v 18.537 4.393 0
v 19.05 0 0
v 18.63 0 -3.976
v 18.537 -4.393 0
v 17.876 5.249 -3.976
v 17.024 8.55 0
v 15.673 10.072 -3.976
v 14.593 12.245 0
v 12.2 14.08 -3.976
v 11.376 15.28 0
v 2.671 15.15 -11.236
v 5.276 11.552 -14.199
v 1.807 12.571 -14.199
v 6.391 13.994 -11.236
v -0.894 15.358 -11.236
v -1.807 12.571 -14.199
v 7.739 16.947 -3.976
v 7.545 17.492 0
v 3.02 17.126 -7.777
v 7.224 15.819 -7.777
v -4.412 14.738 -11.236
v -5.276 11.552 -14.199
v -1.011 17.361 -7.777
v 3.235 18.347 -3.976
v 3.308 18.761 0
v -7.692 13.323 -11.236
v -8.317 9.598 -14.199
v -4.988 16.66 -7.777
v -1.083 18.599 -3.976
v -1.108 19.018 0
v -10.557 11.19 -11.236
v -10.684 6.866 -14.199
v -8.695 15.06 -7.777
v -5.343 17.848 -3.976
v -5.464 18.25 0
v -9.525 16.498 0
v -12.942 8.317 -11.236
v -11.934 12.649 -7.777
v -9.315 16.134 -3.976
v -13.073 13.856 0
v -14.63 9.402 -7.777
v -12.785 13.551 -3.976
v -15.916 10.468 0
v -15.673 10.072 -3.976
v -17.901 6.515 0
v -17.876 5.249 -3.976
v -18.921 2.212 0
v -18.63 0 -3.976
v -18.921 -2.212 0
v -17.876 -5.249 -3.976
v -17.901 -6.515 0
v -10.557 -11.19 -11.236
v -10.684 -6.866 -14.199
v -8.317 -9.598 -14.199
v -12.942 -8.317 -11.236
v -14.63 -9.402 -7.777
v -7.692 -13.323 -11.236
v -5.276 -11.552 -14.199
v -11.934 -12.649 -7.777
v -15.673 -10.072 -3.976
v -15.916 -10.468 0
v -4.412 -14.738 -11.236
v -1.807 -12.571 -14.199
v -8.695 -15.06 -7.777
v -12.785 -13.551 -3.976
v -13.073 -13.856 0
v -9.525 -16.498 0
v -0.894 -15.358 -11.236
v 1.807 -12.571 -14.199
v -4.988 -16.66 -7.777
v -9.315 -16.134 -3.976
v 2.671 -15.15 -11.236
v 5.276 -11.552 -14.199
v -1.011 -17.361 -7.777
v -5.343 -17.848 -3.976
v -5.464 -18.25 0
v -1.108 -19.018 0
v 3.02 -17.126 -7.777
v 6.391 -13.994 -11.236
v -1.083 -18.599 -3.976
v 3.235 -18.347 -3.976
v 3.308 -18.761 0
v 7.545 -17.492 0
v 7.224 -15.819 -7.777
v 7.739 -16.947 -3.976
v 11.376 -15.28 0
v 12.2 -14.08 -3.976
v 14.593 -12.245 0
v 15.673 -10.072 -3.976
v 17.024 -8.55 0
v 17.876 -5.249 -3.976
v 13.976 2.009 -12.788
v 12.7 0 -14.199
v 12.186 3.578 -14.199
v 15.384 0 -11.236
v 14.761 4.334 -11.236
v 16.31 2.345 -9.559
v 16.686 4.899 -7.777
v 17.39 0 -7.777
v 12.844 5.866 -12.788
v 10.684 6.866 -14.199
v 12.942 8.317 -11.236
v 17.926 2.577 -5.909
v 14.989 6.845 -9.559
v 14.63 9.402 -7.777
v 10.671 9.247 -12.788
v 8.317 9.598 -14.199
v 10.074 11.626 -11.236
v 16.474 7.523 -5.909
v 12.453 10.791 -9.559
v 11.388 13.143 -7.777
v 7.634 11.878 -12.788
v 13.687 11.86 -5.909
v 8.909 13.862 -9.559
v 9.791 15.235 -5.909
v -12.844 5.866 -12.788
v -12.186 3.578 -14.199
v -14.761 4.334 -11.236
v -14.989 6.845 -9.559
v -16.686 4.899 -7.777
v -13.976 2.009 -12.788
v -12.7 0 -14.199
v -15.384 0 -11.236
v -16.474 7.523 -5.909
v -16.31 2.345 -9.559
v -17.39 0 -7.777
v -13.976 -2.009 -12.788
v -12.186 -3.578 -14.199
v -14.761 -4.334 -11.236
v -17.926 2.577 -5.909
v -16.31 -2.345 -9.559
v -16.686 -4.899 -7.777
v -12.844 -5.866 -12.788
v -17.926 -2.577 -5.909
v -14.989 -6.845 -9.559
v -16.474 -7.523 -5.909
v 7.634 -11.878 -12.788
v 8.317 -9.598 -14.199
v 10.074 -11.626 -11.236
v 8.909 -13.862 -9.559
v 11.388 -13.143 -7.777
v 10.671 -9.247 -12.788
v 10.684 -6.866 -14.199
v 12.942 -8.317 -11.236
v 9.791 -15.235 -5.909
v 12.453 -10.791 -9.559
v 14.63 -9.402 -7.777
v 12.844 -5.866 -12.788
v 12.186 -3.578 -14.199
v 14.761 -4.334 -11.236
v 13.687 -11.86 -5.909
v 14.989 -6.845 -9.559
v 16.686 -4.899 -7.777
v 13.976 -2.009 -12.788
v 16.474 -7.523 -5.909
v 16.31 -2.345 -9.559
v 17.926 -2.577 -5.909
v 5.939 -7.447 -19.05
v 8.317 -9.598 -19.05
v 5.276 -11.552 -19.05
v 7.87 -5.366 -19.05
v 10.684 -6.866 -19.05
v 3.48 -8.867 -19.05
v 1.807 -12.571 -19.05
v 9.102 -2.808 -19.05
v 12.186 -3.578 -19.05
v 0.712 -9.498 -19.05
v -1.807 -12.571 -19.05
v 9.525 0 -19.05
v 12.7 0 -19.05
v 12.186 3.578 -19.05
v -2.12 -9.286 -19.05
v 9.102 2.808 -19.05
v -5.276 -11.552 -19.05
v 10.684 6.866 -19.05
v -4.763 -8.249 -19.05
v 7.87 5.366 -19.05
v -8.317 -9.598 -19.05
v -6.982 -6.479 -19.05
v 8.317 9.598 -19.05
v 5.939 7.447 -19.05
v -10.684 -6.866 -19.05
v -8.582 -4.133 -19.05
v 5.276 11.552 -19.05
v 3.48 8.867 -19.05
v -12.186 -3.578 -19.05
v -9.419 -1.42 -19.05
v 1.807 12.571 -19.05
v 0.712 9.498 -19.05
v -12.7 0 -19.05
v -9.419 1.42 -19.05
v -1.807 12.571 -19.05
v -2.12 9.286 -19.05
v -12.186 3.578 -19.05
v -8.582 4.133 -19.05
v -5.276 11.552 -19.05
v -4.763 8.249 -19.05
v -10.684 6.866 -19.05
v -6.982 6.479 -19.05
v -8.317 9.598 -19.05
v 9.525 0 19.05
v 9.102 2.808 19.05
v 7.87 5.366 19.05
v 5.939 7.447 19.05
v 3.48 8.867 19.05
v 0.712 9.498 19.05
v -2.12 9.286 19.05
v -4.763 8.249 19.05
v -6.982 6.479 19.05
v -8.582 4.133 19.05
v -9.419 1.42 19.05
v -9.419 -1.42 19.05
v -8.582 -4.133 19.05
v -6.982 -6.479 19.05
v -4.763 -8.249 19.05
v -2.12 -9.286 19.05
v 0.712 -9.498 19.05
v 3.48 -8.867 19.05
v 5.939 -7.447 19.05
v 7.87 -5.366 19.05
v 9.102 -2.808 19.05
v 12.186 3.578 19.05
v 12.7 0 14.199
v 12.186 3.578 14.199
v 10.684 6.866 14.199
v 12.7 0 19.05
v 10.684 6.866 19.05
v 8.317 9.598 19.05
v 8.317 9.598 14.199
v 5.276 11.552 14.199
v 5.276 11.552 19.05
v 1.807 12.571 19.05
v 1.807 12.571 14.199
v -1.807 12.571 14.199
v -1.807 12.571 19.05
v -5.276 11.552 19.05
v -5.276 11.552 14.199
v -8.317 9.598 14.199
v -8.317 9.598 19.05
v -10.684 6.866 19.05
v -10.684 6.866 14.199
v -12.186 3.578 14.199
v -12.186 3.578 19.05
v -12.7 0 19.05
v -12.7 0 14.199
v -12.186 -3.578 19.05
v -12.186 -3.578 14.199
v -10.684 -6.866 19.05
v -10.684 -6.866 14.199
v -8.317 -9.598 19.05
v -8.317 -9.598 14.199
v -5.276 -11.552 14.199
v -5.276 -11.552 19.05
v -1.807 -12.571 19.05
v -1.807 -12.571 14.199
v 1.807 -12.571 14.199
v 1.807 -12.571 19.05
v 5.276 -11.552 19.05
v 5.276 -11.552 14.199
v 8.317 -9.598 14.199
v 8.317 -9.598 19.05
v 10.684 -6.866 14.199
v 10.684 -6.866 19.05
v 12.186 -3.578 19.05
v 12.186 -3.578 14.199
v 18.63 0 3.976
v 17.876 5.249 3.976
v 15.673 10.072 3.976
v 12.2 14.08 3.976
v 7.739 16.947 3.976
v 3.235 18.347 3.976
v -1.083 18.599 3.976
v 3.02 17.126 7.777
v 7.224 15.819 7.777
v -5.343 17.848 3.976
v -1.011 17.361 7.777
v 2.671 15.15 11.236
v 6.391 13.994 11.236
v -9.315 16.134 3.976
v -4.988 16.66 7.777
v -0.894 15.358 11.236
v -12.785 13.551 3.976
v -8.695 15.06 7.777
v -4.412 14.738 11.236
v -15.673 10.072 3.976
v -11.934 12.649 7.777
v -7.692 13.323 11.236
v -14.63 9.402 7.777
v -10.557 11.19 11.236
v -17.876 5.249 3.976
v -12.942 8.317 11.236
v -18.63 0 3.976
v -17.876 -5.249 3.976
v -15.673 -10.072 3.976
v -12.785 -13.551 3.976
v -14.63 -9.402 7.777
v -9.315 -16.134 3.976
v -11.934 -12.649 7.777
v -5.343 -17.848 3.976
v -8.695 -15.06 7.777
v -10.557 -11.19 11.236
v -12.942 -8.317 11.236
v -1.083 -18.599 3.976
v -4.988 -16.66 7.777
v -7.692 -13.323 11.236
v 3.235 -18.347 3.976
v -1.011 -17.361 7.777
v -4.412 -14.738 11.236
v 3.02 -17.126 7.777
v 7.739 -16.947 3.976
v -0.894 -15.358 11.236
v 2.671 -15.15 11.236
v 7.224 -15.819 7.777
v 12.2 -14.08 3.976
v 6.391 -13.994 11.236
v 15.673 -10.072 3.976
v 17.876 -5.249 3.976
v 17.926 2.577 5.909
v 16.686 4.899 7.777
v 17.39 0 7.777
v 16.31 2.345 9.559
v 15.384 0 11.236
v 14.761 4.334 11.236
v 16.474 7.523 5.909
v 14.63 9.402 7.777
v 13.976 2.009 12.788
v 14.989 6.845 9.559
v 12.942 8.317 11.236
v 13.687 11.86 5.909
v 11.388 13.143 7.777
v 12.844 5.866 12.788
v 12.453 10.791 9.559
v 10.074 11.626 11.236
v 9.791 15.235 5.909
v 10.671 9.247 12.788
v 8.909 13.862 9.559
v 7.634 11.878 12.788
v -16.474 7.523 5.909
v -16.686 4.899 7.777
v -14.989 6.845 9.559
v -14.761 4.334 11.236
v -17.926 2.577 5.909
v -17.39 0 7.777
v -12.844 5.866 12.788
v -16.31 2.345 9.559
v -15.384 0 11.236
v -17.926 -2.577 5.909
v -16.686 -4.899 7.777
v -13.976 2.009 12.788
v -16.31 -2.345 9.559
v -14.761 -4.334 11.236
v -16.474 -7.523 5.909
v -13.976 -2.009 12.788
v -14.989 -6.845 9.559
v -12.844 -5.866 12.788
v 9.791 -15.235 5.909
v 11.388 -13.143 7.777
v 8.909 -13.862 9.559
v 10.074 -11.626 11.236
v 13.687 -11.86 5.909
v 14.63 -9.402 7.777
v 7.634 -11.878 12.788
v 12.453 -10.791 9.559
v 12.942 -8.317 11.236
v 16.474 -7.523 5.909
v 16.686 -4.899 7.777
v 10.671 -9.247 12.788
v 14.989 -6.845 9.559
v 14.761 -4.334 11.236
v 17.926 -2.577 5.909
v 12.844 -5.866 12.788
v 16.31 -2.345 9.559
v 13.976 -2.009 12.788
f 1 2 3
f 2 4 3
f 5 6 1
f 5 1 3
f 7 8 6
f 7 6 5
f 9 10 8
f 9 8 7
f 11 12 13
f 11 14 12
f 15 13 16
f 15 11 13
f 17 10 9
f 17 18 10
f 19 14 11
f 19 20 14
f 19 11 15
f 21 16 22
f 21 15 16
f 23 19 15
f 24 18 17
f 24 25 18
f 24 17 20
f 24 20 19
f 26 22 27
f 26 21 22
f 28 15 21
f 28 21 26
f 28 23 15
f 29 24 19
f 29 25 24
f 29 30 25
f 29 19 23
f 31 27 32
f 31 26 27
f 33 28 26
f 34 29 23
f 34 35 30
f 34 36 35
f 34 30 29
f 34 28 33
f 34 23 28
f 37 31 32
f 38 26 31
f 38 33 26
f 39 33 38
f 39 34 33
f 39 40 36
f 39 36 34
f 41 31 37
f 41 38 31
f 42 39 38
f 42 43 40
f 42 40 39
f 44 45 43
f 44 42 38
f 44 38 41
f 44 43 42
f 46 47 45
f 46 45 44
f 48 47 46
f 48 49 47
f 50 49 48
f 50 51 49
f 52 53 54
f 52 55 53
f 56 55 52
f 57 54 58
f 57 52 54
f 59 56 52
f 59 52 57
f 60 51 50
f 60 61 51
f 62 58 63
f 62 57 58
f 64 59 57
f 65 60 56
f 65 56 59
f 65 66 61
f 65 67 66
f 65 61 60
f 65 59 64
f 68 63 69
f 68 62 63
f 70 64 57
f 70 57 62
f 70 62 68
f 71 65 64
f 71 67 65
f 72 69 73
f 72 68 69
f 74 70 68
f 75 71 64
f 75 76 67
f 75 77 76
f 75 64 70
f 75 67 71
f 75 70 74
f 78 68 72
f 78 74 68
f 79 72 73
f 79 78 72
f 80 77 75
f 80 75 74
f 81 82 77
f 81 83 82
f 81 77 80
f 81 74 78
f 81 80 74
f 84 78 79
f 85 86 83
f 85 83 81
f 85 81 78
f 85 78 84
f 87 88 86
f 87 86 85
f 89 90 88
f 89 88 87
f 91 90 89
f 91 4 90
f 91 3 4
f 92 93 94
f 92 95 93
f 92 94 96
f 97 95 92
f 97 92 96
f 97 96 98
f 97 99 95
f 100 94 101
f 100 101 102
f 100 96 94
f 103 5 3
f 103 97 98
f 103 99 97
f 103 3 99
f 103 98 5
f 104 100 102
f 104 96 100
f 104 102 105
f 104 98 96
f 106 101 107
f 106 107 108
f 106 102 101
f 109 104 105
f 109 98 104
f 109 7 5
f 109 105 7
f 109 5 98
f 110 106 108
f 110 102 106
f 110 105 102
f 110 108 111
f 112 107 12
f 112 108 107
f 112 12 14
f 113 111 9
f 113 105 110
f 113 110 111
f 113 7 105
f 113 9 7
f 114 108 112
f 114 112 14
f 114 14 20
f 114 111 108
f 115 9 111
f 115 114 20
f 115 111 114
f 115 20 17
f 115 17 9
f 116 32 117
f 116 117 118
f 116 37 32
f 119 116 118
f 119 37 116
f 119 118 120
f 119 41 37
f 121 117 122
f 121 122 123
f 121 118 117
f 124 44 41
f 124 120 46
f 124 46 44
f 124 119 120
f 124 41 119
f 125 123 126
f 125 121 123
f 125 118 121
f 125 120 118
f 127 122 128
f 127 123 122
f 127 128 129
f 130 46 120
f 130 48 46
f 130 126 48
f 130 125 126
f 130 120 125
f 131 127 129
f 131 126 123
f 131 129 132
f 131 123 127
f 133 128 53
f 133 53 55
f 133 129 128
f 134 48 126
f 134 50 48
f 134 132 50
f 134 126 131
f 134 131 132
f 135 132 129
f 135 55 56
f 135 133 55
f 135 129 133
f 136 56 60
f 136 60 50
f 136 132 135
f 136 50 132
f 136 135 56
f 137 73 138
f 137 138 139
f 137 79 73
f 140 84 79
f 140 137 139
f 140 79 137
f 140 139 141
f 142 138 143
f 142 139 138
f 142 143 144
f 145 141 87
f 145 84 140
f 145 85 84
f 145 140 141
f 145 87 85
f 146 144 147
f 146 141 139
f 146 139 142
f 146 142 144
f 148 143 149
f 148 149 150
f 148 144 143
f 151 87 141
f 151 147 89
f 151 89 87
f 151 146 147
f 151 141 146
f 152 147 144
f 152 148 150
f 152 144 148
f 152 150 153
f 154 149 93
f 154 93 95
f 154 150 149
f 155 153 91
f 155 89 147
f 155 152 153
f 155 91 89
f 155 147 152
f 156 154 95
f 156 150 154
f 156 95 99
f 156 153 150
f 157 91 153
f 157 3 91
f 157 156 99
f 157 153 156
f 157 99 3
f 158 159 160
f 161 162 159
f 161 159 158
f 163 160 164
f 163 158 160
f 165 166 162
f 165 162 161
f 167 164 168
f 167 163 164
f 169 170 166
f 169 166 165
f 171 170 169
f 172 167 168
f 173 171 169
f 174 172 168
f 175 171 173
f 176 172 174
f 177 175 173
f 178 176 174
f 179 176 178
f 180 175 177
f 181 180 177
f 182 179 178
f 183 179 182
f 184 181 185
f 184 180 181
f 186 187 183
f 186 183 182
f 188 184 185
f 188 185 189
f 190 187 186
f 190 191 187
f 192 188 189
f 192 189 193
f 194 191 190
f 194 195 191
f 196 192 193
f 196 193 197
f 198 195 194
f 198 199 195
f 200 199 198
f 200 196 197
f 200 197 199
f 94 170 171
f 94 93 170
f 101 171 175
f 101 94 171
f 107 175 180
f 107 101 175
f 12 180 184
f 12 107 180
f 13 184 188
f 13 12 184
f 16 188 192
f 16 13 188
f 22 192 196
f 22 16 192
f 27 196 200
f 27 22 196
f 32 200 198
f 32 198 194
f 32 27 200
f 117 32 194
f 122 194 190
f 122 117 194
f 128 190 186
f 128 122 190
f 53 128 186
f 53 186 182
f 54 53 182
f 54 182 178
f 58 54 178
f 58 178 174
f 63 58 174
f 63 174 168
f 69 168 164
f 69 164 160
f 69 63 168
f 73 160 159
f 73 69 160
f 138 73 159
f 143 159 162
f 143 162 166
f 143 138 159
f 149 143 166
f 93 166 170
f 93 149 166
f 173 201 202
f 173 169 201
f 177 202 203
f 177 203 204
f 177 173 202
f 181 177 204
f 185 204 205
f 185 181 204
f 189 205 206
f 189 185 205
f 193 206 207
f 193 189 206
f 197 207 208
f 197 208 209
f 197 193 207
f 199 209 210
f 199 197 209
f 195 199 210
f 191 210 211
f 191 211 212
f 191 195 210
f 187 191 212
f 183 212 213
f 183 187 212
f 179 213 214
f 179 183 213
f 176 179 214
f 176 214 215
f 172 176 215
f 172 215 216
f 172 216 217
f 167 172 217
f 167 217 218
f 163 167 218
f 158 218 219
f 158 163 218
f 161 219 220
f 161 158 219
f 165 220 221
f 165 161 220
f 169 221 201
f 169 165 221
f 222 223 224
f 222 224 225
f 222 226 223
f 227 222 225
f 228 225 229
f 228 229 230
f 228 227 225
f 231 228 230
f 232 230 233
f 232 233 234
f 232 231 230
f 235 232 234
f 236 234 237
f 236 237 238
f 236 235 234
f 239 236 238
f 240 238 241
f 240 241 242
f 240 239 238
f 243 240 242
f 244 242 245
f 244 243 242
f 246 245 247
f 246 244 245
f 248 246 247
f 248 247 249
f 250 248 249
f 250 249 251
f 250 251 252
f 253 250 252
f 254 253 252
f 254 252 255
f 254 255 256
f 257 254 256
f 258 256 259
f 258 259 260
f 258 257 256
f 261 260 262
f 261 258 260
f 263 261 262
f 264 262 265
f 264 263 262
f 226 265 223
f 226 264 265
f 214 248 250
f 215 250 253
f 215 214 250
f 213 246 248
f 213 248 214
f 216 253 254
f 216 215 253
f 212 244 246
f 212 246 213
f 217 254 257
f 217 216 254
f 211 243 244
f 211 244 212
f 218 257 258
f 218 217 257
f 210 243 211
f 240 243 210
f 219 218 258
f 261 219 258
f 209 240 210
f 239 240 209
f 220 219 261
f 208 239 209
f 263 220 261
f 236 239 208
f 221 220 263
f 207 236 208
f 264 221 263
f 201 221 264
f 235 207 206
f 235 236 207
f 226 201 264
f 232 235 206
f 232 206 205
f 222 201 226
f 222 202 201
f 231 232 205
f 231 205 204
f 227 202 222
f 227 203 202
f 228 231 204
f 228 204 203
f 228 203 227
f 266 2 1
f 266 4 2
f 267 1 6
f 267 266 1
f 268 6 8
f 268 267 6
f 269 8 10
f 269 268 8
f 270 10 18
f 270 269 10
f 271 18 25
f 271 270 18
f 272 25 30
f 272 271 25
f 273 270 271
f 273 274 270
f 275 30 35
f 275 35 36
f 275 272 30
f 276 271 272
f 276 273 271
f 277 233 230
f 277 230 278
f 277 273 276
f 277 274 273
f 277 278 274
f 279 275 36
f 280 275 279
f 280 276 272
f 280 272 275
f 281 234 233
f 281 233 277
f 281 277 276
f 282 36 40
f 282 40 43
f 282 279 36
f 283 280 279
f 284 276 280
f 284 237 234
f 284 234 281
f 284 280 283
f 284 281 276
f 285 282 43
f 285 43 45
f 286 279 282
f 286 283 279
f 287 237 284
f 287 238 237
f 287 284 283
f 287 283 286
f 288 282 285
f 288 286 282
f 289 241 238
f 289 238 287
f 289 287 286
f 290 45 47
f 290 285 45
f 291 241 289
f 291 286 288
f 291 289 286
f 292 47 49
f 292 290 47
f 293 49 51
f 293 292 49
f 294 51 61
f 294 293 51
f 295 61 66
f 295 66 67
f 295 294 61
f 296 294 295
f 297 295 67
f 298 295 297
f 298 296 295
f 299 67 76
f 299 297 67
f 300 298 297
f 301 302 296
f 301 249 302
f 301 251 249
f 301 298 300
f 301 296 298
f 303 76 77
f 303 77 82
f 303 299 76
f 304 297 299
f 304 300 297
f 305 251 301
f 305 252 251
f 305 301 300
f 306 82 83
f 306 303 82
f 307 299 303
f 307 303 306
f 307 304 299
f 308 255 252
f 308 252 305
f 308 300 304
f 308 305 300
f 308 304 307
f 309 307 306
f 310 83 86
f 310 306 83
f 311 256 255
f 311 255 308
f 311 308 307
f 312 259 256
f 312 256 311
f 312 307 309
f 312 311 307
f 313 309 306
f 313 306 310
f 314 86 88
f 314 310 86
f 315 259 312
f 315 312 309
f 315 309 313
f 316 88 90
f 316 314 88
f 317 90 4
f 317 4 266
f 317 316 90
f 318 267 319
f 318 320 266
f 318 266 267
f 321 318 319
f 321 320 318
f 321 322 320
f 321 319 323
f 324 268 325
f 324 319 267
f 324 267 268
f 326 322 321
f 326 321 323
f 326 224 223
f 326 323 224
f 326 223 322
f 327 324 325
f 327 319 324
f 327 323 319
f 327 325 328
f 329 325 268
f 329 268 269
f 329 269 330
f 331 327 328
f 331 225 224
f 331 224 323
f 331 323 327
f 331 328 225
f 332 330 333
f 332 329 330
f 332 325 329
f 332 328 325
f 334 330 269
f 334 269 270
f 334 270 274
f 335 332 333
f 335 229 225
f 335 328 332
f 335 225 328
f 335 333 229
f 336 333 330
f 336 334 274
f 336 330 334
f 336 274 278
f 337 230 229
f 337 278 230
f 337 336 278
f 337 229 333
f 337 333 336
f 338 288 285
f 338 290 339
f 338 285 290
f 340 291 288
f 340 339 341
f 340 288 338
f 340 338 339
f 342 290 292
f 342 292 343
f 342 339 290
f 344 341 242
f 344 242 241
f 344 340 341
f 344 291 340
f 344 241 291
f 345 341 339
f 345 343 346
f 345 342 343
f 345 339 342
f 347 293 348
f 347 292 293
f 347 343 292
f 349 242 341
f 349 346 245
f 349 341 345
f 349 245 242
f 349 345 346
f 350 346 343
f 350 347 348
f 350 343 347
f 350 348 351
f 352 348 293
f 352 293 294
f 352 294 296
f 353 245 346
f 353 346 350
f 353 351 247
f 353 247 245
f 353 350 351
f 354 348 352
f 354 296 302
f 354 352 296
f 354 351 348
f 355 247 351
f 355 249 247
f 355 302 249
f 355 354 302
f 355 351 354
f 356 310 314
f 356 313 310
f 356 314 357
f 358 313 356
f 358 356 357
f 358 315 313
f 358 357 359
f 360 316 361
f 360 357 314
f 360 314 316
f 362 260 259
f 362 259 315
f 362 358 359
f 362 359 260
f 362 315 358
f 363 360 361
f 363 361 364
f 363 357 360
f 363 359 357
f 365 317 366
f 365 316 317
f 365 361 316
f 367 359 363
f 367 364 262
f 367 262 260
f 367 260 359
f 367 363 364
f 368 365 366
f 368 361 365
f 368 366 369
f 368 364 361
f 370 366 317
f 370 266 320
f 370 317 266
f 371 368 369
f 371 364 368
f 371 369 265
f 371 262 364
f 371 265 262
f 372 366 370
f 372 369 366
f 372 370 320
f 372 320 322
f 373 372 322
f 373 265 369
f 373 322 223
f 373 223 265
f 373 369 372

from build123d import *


with BuildPart() as f1:
    # F0 (on Front) → F1 (revolve)
    with BuildSketch(Plane.XZ):
        with BuildLine():
            Line((9.525, 19.05), (9.525, 0))
            Line((9.525, 0), (9.525, -19.05))
            Line((9.525, -19.05), (12.7, -19.05))
            Line((12.7, -19.05), (12.7, -14.199032))
            ThreePointArc((12.7, -14.199032), (17.390191, -7.77713), (19.05, 0))
            ThreePointArc((19.05, 0), (17.390191, 7.77713), (12.7, 14.199032))
            Line((12.7, 14.199032), (12.7, 19.05))
            Line((12.7, 19.05), (9.525, 19.05))
        make_face()
    revolve(axis=Axis((0, 0, 9.525), (0, 0, 1)))


solid = f1.part
